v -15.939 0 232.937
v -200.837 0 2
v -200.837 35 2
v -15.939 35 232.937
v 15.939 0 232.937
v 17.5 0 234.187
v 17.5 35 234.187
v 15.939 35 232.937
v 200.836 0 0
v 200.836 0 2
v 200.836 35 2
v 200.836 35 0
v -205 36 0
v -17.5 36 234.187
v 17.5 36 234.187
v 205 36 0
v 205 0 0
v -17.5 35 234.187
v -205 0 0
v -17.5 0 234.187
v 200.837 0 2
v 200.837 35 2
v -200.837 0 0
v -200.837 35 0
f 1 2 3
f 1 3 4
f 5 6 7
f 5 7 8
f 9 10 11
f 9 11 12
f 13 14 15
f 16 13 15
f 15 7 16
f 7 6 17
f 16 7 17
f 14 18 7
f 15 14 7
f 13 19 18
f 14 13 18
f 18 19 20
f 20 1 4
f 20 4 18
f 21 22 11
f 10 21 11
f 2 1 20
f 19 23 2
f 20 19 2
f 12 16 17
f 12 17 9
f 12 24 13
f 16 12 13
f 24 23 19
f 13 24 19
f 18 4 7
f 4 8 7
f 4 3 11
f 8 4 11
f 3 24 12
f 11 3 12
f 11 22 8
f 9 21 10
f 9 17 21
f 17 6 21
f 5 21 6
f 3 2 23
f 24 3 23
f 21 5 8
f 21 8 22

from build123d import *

# Parameters (mm, degrees)
BOSS_EXTRUDE1_DEPTH     = 35
CUT_EXTRUDE1_DEPTH      = 314.199217751
CUT_EXTRUDE1_DEPTH_BACK = 314.199217751
SKETCH2_W               = 401.672921909
SKETCH2_H               = 2
BOSS_EXTRUDE2_DEPTH     = 1


with BuildPart() as part:
    # Sketch1 → Boss-Extrude1 (new body)
    with BuildSketch(Plane(origin=(0, 0, 0), x_dir=(1, 0, 0), z_dir=(0, 1, 0))):
        Polygon((-205, 0), (205, 0), (17.5, -234.18742494), (15.9387505, -232.93742494), (200.836668001, -2), (-200.836668001, -2), (-15.9387505, -232.93742494), (-17.5, -234.18742494), align=None)
    extrude(amount=BOSS_EXTRUDE1_DEPTH)

    # Sketch2 → Cut-Extrude1 (cut, two sides: drawn at the far end of the back side and taken through both)
    with BuildSketch(Plane(origin=(0, 35, 0), x_dir=(1, 0, 0), z_dir=(0, 1, 0)).offset(-CUT_EXTRUDE1_DEPTH_BACK)):
        with Locations((-0.000207047, -1)):
            Rectangle(SKETCH2_W, SKETCH2_H)
    extrude(amount=CUT_EXTRUDE1_DEPTH + CUT_EXTRUDE1_DEPTH_BACK, mode=Mode.SUBTRACT)


with BuildPart() as cut_extrude1_piece_1:
    # of the separate pieces the step leaves, piece 1, a body of its own (cut_extrude1_pieces)
    add(part.part.solids().sort_by_distance((200.836253908, 0, 0))[0])



with BuildPart() as cut_extrude1_piece_2:
    # of the separate pieces the step leaves, piece 2, a body of its own (cut_extrude1_pieces)
    add(part.part.solids().sort_by_distance((-205, 0, 0))[0])


with BuildPart() as cut_extrude1_piece_1_1:
    add(cut_extrude1_piece_1.part)

    add(cut_extrude1_piece_2.part)  # Boss-Extrude2 merges Cut-Extrude1 piece 2
    # Sketch3 → Boss-Extrude2 (add)
    with BuildSketch(Plane(origin=(0, 35, 0), x_dir=(1, 0, 0), z_dir=(0, 1, 0))):
        Polygon((-205, 0), (-17.5, -234.18742494), (17.5, -234.18742494), (205, 0), align=None)
    extrude(amount=BOSS_EXTRUDE2_DEPTH)


solid = cut_extrude1_piece_1_1.part
